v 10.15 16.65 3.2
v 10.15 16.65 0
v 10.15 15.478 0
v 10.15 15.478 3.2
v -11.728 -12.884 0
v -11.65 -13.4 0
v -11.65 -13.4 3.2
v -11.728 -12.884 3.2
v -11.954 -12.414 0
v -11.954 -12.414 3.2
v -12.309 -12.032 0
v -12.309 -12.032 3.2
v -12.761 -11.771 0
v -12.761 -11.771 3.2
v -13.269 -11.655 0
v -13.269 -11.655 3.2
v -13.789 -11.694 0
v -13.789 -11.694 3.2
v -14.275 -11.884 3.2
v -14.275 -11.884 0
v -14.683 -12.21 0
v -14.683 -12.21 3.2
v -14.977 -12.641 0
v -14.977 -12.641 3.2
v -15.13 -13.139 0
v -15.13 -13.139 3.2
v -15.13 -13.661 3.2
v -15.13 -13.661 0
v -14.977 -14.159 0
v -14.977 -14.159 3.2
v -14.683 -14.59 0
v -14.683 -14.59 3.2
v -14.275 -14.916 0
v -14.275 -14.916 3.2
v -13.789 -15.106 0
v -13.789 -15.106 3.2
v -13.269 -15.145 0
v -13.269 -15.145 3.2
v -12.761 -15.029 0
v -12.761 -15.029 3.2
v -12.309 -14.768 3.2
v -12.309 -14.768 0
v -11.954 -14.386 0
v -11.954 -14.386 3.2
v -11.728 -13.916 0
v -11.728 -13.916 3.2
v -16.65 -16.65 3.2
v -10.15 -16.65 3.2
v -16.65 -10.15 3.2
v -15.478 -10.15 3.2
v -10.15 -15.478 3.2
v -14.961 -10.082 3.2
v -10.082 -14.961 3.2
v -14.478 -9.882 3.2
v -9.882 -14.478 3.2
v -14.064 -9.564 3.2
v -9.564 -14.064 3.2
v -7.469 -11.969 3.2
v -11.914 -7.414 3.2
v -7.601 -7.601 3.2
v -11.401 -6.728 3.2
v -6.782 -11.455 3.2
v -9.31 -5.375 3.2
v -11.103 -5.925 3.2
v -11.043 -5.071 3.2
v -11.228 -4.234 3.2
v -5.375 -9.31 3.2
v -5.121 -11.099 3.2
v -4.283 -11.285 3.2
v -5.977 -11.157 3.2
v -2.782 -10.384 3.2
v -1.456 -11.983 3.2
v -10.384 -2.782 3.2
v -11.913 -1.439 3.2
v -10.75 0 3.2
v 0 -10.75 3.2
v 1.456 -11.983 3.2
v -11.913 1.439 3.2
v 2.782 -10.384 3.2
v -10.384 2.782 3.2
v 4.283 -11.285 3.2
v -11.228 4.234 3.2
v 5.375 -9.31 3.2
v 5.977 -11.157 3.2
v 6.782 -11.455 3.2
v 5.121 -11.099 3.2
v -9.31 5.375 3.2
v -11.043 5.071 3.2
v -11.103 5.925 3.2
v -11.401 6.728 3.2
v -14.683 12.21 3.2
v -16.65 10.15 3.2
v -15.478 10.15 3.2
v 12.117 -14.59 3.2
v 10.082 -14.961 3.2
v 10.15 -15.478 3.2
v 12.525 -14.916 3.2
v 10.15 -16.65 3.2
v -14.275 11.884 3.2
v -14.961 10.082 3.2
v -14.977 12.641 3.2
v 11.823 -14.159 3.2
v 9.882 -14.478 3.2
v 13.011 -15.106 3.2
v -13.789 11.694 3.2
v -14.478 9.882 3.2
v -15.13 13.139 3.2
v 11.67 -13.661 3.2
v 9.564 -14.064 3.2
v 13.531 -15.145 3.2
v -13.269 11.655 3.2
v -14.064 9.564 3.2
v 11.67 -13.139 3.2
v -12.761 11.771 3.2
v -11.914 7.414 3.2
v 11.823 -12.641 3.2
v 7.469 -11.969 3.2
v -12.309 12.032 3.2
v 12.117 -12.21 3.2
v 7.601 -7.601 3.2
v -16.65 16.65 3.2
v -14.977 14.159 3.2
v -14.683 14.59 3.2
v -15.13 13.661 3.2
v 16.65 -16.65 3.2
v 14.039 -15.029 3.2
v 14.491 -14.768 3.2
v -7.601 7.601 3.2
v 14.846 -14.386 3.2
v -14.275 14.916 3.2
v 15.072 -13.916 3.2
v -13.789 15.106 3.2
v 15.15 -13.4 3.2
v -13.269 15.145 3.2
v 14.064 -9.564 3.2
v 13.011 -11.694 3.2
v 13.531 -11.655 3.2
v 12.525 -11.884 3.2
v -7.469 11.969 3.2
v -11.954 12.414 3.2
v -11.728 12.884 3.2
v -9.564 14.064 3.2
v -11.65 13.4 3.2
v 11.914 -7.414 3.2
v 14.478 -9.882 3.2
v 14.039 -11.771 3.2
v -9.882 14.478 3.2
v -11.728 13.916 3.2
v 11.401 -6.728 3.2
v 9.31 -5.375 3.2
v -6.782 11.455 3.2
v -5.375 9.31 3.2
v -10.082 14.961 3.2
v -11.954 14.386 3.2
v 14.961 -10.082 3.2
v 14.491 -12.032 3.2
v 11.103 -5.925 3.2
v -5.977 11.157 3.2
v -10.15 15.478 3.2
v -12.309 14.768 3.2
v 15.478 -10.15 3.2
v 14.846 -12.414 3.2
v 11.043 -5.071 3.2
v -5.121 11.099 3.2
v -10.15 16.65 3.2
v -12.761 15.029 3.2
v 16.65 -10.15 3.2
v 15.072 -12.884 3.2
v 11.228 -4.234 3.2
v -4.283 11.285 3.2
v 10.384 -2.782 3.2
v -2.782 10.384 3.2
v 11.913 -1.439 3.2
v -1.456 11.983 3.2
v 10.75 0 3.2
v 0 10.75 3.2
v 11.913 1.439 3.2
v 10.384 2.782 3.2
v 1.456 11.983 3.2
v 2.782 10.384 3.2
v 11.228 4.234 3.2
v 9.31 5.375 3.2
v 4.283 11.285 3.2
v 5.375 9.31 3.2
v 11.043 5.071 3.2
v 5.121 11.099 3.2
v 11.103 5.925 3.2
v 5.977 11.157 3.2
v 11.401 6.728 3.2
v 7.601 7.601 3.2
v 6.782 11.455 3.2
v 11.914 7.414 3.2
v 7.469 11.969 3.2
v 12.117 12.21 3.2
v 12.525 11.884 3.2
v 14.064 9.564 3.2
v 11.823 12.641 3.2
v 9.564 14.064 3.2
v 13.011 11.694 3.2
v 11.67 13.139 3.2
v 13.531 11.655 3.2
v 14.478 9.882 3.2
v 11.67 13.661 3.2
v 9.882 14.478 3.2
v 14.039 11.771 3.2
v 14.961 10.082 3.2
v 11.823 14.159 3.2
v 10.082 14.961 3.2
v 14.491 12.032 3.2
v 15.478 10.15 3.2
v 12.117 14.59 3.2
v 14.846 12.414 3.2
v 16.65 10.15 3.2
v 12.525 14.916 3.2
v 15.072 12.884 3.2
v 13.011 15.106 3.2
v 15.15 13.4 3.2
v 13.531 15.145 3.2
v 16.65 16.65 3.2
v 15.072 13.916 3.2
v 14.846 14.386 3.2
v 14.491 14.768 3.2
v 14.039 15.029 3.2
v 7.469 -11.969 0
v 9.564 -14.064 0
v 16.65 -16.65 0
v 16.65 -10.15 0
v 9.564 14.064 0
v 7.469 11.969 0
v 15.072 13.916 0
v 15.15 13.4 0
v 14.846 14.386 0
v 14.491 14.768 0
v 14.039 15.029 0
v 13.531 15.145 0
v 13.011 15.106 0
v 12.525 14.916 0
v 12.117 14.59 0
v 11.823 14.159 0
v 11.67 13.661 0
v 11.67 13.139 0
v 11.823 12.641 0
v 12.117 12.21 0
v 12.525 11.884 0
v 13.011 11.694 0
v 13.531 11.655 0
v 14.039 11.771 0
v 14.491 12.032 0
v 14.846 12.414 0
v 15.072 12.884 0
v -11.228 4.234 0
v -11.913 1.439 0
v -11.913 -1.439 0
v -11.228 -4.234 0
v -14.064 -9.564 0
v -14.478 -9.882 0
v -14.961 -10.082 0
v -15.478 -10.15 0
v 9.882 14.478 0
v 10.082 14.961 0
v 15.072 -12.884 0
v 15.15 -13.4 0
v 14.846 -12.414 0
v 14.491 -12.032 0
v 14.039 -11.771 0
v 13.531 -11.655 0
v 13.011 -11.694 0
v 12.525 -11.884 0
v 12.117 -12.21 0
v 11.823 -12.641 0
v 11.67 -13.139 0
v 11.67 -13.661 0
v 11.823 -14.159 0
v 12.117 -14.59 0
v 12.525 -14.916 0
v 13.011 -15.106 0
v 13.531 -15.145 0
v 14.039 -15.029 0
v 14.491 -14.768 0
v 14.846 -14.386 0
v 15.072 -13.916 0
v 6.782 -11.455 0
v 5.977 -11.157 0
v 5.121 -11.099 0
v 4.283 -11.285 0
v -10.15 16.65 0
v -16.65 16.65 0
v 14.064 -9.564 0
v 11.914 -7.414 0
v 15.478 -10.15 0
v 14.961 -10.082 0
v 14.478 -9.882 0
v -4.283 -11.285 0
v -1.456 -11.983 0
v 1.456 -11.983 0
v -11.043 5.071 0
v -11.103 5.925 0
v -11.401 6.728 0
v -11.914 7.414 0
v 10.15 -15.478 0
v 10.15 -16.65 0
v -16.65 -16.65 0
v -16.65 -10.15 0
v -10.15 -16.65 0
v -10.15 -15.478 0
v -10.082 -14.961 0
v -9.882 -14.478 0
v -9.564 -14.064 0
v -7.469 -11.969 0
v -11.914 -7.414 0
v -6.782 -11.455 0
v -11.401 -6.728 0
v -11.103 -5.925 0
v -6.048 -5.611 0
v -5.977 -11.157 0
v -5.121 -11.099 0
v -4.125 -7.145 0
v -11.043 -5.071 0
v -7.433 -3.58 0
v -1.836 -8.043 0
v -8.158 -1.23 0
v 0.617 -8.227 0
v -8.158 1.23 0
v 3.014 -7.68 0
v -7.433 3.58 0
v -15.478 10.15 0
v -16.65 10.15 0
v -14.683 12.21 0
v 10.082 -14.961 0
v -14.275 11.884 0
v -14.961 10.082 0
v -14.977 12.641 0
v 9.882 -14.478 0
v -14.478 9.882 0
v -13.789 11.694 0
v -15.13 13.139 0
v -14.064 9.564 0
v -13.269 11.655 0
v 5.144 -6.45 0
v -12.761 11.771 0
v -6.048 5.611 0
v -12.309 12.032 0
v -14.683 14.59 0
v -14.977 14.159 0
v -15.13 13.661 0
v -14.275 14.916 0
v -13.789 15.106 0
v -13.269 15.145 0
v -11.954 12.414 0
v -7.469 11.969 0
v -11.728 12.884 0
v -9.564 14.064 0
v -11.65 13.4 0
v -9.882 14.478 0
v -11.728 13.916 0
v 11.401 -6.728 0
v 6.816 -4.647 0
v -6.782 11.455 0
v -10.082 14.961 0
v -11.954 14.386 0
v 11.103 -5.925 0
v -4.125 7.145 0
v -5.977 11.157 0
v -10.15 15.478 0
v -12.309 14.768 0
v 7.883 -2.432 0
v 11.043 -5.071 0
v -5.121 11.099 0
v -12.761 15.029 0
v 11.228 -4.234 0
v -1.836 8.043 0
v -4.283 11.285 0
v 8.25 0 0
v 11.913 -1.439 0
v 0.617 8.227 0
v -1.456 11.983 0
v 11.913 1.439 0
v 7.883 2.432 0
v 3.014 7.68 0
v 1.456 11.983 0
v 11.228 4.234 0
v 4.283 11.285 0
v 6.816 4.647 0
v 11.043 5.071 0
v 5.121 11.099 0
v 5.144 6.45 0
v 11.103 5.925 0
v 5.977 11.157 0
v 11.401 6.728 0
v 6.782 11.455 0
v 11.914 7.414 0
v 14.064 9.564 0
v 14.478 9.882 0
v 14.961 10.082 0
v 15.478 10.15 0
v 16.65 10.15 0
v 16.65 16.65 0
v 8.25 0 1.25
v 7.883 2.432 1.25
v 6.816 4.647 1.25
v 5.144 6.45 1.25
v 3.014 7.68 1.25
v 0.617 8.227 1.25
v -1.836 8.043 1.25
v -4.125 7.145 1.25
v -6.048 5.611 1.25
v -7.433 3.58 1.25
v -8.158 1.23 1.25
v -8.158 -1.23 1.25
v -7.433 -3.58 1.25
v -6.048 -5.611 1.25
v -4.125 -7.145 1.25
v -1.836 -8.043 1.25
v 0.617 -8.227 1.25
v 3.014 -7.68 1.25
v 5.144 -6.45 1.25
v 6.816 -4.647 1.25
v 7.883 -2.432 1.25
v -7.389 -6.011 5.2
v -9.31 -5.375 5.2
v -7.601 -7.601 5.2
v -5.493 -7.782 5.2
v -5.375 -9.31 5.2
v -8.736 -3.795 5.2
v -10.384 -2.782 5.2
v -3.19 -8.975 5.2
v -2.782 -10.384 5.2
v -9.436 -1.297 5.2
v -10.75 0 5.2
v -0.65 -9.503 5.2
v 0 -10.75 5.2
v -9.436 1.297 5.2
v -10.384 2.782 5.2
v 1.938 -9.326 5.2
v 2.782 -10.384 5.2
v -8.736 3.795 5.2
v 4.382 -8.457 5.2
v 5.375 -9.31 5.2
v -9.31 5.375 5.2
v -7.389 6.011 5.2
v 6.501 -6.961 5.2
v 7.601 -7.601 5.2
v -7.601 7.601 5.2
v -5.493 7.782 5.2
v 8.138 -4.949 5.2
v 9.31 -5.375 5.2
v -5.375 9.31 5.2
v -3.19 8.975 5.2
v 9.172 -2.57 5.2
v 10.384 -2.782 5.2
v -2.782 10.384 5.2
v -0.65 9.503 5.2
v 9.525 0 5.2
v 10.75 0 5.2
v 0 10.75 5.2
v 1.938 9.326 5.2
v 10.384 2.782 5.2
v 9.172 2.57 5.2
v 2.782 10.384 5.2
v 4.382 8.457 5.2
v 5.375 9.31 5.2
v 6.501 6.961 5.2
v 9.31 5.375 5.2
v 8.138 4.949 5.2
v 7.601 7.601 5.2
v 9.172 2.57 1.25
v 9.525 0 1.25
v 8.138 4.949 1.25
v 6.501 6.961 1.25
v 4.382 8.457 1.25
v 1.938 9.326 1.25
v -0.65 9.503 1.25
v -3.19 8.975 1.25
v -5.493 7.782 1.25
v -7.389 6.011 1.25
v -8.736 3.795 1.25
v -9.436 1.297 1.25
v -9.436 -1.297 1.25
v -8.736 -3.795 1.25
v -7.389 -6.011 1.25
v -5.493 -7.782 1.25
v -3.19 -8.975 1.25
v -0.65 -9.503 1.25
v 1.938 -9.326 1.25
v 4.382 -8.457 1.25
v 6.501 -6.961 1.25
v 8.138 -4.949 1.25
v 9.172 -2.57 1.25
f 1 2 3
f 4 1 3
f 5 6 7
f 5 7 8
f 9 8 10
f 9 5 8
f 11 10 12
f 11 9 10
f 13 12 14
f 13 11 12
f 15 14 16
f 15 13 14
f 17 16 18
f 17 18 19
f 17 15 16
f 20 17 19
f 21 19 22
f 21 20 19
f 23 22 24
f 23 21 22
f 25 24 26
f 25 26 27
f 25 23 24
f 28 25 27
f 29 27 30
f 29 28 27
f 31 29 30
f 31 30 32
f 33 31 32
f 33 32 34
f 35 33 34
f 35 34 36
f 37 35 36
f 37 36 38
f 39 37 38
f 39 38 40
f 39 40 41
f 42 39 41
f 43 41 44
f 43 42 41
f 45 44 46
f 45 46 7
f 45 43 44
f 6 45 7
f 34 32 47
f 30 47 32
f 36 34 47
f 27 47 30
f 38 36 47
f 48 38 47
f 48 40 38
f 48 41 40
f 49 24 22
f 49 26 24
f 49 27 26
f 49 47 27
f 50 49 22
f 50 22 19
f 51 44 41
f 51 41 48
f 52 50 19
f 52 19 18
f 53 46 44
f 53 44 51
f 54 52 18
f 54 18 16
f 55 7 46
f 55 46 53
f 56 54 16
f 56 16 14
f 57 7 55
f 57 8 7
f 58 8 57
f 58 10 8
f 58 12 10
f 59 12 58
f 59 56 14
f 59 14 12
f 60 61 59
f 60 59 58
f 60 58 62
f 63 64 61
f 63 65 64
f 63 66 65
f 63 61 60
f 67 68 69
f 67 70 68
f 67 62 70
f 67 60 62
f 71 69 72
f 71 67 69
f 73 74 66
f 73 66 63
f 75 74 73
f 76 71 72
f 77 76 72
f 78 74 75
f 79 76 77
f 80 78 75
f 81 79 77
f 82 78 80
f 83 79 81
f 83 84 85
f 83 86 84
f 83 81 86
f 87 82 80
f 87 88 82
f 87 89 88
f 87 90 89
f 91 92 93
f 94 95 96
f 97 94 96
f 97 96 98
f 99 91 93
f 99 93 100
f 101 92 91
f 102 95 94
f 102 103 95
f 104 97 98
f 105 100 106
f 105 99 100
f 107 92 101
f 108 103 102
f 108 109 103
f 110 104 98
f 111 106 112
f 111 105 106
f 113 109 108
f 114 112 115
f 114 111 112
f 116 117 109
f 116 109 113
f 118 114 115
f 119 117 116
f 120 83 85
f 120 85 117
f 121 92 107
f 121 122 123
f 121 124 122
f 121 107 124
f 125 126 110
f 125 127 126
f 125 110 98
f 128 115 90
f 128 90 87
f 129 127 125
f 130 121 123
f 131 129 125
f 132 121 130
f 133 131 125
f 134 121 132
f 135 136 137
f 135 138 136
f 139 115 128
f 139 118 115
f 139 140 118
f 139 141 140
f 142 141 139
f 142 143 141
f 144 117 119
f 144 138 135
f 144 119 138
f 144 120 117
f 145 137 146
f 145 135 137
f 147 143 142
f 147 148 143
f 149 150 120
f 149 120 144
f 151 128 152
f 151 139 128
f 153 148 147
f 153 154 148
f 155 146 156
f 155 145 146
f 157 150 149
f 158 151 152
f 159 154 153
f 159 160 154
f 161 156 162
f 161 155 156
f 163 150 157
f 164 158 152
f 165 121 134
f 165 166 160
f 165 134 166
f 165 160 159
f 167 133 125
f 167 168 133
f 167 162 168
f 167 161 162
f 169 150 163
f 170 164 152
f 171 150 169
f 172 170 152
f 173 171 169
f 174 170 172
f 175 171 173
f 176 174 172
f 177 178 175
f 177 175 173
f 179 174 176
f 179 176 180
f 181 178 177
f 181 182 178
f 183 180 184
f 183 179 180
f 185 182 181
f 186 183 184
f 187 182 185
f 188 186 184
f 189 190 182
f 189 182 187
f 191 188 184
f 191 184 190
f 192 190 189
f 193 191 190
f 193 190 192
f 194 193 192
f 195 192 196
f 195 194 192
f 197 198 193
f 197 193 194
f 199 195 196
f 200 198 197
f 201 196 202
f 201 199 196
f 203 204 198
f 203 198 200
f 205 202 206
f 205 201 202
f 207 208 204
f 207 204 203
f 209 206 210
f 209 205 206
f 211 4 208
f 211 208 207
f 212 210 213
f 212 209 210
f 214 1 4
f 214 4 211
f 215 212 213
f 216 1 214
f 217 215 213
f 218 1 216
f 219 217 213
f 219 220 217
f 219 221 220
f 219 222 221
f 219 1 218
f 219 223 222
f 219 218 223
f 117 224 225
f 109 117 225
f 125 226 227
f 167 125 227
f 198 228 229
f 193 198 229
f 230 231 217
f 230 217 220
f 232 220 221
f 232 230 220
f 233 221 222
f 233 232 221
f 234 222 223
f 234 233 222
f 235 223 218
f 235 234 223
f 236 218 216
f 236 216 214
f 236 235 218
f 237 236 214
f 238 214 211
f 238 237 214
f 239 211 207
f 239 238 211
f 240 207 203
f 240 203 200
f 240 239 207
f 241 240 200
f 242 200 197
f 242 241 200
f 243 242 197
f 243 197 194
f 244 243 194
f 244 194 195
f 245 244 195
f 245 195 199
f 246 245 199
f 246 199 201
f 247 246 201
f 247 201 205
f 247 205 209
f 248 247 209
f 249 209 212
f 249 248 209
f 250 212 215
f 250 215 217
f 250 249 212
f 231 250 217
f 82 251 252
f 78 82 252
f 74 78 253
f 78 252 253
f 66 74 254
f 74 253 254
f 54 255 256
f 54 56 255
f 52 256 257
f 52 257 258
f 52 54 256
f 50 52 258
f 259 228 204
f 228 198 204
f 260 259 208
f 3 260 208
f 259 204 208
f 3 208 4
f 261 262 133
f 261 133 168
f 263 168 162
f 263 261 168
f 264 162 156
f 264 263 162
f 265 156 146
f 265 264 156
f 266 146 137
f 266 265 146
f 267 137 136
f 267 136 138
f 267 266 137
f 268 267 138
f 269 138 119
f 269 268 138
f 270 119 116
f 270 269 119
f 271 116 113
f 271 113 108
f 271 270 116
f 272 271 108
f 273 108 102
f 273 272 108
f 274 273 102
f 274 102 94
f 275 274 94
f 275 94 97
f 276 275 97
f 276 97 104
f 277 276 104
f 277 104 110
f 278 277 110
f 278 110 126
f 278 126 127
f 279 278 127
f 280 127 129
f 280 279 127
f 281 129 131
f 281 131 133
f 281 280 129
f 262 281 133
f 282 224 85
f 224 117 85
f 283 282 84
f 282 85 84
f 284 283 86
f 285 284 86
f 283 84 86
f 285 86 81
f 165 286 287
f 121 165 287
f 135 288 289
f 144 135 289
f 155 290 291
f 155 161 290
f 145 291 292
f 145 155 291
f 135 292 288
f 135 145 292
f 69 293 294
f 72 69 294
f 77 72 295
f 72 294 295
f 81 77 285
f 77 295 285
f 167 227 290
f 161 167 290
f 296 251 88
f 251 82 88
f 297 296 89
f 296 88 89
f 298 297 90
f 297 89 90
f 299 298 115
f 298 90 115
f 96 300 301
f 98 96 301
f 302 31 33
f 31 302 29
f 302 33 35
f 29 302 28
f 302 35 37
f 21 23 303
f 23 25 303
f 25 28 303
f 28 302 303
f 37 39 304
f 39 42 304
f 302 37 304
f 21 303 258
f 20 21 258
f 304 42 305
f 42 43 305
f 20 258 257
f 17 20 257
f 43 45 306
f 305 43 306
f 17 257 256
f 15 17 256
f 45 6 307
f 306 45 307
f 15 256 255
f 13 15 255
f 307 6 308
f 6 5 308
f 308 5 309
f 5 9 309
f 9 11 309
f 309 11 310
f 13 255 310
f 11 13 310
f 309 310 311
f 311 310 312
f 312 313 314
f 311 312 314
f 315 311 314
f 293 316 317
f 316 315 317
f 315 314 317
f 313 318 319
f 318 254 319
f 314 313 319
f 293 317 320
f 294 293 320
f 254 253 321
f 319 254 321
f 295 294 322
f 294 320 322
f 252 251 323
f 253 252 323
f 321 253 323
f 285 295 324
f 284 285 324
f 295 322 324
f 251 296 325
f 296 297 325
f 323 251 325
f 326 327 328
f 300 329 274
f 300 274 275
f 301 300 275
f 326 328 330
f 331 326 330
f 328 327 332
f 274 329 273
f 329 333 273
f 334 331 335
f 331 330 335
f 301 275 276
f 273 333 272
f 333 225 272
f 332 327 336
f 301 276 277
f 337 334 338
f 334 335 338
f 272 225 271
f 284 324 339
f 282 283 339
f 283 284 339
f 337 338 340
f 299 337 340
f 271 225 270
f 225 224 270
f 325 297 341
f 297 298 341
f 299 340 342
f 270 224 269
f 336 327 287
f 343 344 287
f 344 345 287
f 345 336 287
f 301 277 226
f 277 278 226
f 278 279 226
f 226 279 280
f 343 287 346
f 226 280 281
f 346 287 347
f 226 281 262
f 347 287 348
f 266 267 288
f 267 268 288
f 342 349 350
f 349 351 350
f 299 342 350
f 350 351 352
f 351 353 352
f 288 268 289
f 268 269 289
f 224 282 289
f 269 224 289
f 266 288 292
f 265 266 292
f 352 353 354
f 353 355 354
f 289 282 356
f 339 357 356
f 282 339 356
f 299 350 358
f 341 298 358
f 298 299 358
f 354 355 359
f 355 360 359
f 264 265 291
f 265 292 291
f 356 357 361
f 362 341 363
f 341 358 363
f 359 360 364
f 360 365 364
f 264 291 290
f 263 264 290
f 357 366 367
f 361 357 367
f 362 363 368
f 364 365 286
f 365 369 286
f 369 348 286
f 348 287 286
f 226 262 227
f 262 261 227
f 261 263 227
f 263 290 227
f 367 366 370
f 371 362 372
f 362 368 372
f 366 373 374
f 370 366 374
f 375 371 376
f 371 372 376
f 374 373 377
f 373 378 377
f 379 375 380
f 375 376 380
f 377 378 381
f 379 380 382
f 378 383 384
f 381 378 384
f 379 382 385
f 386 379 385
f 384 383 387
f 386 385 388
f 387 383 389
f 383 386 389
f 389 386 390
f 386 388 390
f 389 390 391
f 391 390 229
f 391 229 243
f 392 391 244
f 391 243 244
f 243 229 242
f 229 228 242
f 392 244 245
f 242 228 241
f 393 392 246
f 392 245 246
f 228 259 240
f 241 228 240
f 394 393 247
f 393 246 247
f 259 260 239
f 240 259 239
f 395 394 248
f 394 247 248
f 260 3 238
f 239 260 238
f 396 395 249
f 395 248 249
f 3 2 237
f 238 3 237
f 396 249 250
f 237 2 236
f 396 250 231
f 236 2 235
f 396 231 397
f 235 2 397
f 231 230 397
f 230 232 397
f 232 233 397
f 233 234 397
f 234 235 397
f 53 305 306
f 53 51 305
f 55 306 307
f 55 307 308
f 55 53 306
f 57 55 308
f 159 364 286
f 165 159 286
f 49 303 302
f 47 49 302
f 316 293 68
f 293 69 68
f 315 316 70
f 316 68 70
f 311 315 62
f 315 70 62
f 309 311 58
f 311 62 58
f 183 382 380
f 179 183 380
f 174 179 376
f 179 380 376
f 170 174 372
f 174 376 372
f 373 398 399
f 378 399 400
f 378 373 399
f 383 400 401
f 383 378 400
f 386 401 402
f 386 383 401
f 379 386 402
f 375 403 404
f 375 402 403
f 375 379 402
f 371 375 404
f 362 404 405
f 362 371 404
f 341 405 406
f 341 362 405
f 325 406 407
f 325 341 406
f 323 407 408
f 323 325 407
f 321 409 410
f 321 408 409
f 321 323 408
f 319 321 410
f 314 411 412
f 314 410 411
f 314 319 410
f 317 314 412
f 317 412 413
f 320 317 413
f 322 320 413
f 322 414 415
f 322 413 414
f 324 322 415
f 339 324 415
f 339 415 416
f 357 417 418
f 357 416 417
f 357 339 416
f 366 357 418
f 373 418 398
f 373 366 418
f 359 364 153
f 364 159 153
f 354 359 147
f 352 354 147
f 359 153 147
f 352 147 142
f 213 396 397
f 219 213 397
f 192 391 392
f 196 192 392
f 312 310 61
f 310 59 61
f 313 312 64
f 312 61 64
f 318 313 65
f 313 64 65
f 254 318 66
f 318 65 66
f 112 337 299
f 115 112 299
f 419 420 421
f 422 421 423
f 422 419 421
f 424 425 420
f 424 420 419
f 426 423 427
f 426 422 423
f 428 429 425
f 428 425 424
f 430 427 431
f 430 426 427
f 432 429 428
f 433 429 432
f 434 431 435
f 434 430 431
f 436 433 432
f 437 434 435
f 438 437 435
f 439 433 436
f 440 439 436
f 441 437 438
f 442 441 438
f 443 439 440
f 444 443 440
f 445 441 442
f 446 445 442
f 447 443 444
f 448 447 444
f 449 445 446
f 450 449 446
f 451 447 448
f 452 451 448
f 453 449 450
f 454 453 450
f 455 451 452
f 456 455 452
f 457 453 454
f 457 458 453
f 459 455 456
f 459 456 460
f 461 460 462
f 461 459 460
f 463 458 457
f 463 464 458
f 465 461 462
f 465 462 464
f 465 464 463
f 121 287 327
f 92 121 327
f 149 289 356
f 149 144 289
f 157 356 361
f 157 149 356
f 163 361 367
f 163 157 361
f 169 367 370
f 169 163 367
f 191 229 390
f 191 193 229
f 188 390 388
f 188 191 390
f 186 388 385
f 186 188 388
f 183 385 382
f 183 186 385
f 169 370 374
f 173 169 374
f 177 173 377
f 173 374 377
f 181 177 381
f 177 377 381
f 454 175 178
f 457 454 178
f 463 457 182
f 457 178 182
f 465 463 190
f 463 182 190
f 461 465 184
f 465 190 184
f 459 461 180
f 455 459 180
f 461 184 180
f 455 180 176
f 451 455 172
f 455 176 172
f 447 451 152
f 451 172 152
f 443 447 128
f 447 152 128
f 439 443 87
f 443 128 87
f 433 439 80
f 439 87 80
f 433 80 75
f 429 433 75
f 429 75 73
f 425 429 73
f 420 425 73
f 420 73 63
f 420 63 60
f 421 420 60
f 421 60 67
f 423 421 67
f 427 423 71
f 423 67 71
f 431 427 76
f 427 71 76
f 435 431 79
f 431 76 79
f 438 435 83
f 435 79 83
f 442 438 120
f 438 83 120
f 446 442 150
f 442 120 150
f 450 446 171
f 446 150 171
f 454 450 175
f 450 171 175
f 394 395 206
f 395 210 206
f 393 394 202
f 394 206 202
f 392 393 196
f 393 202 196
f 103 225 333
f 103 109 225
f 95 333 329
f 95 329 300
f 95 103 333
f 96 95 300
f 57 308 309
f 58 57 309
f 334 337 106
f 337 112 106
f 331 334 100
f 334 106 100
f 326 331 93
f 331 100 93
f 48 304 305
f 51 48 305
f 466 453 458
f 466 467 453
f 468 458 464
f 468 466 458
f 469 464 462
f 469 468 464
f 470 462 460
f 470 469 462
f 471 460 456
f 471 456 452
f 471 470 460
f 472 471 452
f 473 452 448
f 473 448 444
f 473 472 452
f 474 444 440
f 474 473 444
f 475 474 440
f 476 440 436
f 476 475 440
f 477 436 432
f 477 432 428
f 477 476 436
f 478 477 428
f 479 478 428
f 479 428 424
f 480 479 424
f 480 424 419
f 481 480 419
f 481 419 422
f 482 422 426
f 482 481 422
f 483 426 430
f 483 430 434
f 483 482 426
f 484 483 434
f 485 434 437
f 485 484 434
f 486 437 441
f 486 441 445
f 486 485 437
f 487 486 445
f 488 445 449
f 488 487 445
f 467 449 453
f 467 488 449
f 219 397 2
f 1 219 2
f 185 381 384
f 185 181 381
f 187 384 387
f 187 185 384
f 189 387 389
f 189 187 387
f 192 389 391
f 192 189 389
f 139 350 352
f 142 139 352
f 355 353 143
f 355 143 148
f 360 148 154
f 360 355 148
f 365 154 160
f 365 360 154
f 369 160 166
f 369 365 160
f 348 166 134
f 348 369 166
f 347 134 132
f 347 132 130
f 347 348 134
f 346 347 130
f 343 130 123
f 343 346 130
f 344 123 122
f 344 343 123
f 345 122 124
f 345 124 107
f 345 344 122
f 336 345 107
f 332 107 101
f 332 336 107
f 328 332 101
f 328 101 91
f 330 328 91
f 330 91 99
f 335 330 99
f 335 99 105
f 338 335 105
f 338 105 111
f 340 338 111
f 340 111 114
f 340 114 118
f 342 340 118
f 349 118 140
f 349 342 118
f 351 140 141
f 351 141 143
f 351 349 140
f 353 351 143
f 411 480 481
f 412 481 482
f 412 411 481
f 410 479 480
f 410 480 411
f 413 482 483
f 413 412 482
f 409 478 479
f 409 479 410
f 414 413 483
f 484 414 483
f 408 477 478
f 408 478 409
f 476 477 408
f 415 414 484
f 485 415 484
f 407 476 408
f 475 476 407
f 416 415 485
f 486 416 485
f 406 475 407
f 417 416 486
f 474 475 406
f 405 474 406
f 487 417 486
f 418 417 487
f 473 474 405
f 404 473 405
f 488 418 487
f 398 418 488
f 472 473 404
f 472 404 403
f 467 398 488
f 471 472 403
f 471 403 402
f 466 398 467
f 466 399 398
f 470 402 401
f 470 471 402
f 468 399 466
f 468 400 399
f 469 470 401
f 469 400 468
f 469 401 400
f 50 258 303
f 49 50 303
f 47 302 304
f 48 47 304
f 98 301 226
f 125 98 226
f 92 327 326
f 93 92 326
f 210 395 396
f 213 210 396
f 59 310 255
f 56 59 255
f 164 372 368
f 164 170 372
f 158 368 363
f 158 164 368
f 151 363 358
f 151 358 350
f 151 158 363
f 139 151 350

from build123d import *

# Parameters (mm, degrees)
F0_R     = 1.75
F0_R_2   = 8.25
F1_DEPTH = 3.2
F2_R     = 9.525
F3_DEPTH = 1.95
F4_R     = 10.75
F4_R_2   = 9.525
F5_DEPTH = 2
F6_R     = 2
F7_R     = 3


with BuildPart() as f1:
    # F0 (on Top) → F1 (new body)
    with BuildSketch(Plane.XY):
        with BuildLine():
            Line((14.65, -10.15), (10.431534, -5.931534))
            ThreePointArc((10.431534, -5.931534), (12, 0), (10.431534, 5.931534))
            Line((10.431534, 5.931534), (14.65, 10.15))
            Line((14.65, 10.15), (16.65, 10.15))
            Line((16.65, 10.15), (16.65, 16.65))
            Line((16.65, 16.65), (10.15, 16.65))
            Line((10.15, 16.65), (10.15, 14.65))
            Line((10.15, 14.65), (5.983453, 10.483453))
            ThreePointArc((5.983453, 10.483453), (0, 12.070812), (-5.983453, 10.483453))
            Line((-5.983453, 10.483453), (-10.15, 14.65))
            Line((-10.15, 14.65), (-10.15, 16.65))
            Line((-10.15, 16.65), (-16.65, 16.65))
            Line((-16.65, 16.65), (-16.65, 10.15))
            Line((-16.65, 10.15), (-14.65, 10.15))
            Line((-14.65, 10.15), (-10.431534, 5.931534))
            ThreePointArc((-10.431534, 5.931534), (-12, 0), (-10.431534, -5.931534))
            Line((-10.431534, -5.931534), (-14.65, -10.15))
            Line((-14.65, -10.15), (-16.65, -10.15))
            Line((-16.65, -10.15), (-16.65, -16.65))
            Line((-16.65, -16.65), (-10.15, -16.65))
            Line((-10.15, -16.65), (-10.15, -14.65))
            Line((-10.15, -14.65), (-5.983453, -10.483453))
            ThreePointArc((-5.983453, -10.483453), (0, -12.070812), (5.983453, -10.483453))
            Line((5.983453, -10.483453), (10.15, -14.65))
            Line((10.15, -14.65), (10.15, -16.65))
            Line((10.15, -16.65), (16.65, -16.65))
            Line((16.65, -16.65), (16.65, -10.15))
            Line((16.65, -10.15), (14.65, -10.15))
        make_face()
        with Locations((-13.4, -13.4)):
            Circle(F0_R, mode=Mode.SUBTRACT)
        with Locations((13.4, -13.4)):
            Circle(F0_R, mode=Mode.SUBTRACT)
        with Locations((-13.4, 13.4)):
            Circle(F0_R, mode=Mode.SUBTRACT)
        Circle(F0_R_2, mode=Mode.SUBTRACT)
        with Locations((13.4, 13.4)):
            Circle(F0_R, mode=Mode.SUBTRACT)
    extrude(amount=F1_DEPTH)

    # F2 (on face) → F3 (cut)
    with BuildSketch(Plane.XY.offset(3.2)):
        Circle(F2_R)
    extrude(amount=-F3_DEPTH, mode=Mode.SUBTRACT)

    # F4 (on face) → F5 (join)
    with BuildSketch(Plane.XY.offset(3.2)):
        Circle(F4_R)
        Circle(F4_R_2, mode=Mode.SUBTRACT)
    extrude(amount=F5_DEPTH)

    # F6
    f6_edges = [f1.edges().sort_by_distance(p)[0] for p in [
        (-14.65, 10.15, 1.6),
        (-10.15, 14.65, 1.6),
        (10.15, 14.65, 1.6),
        (14.65, 10.15, 1.6),
        (14.65, -10.15, 1.6),
        (10.15, -14.65, 1.6),
        (-10.15, -14.65, 1.6),
        (-14.65, -10.15, 1.6),
    ]]
    fillet(f6_edges, radius=F6_R)

    # F7
    f7_edges = [f1.edges().sort_by_distance(p)[0] for p in [
        (-10.431534, -5.931534, 1.6),
        (-10.431534, 5.931534, 1.6),
        (-5.983453, 10.483453, 1.6),
        (5.983453, 10.483453, 1.6),
        (10.431534, 5.931534, 1.6),
        (10.431534, -5.931534, 1.6),
        (-5.983453, -10.483453, 1.6),
        (5.983453, -10.483453, 1.6),
    ]]
    fillet(f7_edges, radius=F7_R)


solid = f1.part
